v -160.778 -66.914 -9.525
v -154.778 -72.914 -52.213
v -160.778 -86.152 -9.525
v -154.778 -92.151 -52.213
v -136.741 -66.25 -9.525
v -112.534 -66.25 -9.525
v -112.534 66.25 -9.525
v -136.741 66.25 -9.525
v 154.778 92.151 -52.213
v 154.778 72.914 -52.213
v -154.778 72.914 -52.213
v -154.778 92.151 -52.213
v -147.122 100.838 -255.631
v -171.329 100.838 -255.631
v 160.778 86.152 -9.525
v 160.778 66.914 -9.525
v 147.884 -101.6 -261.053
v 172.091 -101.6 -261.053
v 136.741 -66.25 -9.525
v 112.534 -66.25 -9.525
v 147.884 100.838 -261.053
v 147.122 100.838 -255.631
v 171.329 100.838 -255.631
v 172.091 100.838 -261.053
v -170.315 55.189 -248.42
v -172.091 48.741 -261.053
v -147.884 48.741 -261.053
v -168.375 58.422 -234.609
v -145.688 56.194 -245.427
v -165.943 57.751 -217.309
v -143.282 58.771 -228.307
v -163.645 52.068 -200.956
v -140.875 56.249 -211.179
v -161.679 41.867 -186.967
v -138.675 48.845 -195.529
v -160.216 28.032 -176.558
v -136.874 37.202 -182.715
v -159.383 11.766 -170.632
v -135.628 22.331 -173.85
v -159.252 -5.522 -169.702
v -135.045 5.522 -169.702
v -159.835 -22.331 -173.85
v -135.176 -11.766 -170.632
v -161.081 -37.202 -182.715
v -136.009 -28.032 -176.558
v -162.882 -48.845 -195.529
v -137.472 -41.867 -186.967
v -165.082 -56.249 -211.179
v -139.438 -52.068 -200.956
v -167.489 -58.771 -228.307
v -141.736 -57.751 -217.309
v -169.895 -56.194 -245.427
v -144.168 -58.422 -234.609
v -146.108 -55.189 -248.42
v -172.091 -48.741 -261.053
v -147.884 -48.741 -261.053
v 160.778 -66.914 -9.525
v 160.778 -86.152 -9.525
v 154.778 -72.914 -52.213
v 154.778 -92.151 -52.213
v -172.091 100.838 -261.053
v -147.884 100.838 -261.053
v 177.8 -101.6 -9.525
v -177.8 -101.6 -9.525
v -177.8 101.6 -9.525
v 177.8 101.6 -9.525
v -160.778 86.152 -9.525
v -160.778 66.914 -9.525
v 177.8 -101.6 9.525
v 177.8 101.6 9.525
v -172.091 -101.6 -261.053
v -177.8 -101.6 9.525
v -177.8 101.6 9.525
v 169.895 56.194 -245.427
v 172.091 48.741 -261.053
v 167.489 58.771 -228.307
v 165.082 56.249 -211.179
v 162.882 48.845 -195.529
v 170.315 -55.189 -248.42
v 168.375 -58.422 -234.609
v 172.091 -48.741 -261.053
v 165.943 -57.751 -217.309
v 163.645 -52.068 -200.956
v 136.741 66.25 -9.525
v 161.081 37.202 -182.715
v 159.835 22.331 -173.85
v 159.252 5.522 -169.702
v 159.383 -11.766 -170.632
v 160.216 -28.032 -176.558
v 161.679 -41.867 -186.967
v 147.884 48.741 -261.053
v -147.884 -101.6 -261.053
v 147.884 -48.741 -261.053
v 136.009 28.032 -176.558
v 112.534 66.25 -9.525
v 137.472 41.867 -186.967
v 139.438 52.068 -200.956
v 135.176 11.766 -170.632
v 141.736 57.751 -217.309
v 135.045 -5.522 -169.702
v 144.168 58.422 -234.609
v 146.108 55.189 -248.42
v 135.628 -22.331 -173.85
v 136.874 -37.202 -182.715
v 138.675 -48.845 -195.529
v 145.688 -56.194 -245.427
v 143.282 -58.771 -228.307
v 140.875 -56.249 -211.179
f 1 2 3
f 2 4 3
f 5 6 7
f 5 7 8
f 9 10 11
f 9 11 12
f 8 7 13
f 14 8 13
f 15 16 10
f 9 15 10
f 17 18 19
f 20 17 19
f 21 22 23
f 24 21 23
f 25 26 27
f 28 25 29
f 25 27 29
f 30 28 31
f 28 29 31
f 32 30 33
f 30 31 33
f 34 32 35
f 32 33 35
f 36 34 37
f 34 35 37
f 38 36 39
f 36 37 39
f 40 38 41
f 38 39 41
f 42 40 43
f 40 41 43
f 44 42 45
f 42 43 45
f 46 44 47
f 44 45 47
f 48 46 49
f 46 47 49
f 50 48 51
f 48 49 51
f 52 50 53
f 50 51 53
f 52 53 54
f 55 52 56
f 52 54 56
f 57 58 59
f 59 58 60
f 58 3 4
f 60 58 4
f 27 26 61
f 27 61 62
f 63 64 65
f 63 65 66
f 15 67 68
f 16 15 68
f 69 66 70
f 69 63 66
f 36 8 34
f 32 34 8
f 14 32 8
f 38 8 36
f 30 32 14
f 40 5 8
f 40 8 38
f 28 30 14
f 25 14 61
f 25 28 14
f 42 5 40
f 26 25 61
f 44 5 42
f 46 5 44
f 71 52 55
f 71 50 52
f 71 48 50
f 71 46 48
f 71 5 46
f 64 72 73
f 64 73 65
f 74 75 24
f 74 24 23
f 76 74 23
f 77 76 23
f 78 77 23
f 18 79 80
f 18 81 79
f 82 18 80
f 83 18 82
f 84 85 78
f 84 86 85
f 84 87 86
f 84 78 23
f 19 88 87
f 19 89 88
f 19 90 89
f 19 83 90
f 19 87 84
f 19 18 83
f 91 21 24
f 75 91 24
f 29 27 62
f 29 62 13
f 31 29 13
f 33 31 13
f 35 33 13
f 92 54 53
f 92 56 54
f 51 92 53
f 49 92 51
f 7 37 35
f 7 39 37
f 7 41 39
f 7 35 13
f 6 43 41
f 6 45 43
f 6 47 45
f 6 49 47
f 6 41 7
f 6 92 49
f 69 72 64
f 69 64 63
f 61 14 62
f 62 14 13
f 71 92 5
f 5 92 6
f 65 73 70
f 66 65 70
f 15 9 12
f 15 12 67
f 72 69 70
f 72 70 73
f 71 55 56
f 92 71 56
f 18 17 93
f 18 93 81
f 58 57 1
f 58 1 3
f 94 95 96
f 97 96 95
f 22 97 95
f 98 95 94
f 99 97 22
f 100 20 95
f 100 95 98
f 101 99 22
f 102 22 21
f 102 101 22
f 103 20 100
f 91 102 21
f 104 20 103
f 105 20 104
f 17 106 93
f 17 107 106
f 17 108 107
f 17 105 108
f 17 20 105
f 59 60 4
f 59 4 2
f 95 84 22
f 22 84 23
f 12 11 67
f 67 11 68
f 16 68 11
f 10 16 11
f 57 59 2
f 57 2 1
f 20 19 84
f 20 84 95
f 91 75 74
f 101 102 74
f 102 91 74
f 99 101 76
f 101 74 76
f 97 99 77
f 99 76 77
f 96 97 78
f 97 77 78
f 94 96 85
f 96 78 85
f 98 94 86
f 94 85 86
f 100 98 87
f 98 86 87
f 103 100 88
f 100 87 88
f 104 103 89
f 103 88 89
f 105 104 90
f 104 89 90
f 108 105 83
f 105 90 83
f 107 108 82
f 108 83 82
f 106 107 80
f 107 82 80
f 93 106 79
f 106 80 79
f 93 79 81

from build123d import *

# Parameters (mm, degrees)
F1_DEPTH       = 101.6
F2_DEPTH       = 101.6
F2_DEPTH_BACK  = 100.838
F4_DEPTH       = 177.801
F4_DEPTH_BACK  = 177.801
F6_DEPTH       = 101.601
F6_DEPTH_BACK  = 101.601
F7_DEPTH       = 101.601
F7_DEPTH_BACK  = 101.601
F8_DEPTH       = 161.798
F8_DEPTH_BACK  = 161.798
F9_DEPTH       = 161.798
F9_DEPTH_BACK  = 161.798
F10_DEPTH      = 101.601
F10_DEPTH_BACK = 101.601


# Not quite as in the source:
# - a feature names something its author has since deleted; it is built from what else it names


with BuildPart() as f1:
    # F0 (on Front) → F1 (new body, symmetric)
    with BuildSketch(Plane.XZ):
        Polygon((177.8, -9.525), (177.8, 9.525), (-177.8, 9.525), (-177.8, -9.525), (-160.77771832, -9.525), (-136.7410615279, -9.525), (-112.5340089202, -9.525), (112.5340089202, -9.525), (136.7410615279, -9.525), (160.77771832, -9.525), align=None)
    extrude(amount=F1_DEPTH, both=True)

    # F0 (on Front) → F6 (cut, two sides)
    with BuildSketch(Plane.XZ) as f6_sk:
        Polygon((177.8, -52.5049223718), (177.8, -9.525), (160.77771832, -9.525), (154.7372841544, -52.5049223718), align=None)
    extrude(amount=F6_DEPTH, mode=Mode.SUBTRACT)
    extrude(f6_sk.sketch, amount=-F6_DEPTH_BACK, mode=Mode.SUBTRACT)

    # F0 (on Front) → F7 (cut, two sides)
    with BuildSketch(Plane.XZ) as f7_sk:
        Polygon((-160.77771832, -9.525), (-177.8, -9.525), (-177.8, -52.5049223718), (-154.7372841544, -52.5049223718), align=None)
    extrude(amount=F7_DEPTH, mode=Mode.SUBTRACT)
    extrude(f7_sk.sketch, amount=-F7_DEPTH_BACK, mode=Mode.SUBTRACT)


with BuildPart() as f2:
    # F0 (on Front) → F2 (new body, two sides)
    with BuildSketch(Plane.XZ) as f2_sk:
        Polygon((-118.5744430858, -52.5049223718), (-142.7814956935, -52.5049223718), (-172.0910291718, -261.0530894604), (-147.883976564, -261.0530894604), align=None)
        Polygon((-112.5340089202, -9.525), (-136.7410615279, -9.525), (-142.7814956935, -52.5049223718), (-118.5744430858, -52.5049223718), align=None)
    extrude(amount=F2_DEPTH)
    extrude(f2_sk.sketch, amount=-F2_DEPTH_BACK)


with BuildPart() as f2b:
    # F0 (on Front) → F2, piece 2 (new body, two sides)
    with BuildSketch(Plane.XZ) as f2_2_sk:
        Polygon((142.7814956935, -52.5049223718), (136.7410615279, -9.525), (112.5340089202, -9.525), (118.5744430858, -52.5049223718), align=None)
        Polygon((172.0910291718, -261.0530894604), (142.7814956935, -52.5049223718), (118.5744430858, -52.5049223718), (147.883976564, -261.0530894604), align=None)
    extrude(amount=F2_DEPTH)
    extrude(f2_2_sk.sketch, amount=-F2_DEPTH_BACK)


with BuildPart() as f4_tool:
    # F3 (on Right) → F4 (new body, two sides)
    with BuildSketch(Plane.YZ) as f4_sk:
        Polygon((100.838, -255.6311777319), (100.838, -9.525), (66.2500323562, -9.525), align=None)
        Polygon((-101.6, -261.0530894604), (-66.2500323562, -9.525), (-101.6, -9.525), align=None)
        with BuildLine():
            Line((-48.7405628211, -261.0530894604), (48.7405628211, -261.0530894604))
            ThreePointArc((48.7405628211, -261.0530894604), (0, -169.4420519551), (-48.7405628211, -261.0530894604))
        make_face()
    extrude(amount=F4_DEPTH)
    extrude(f4_sk.sketch, amount=-F4_DEPTH_BACK)


with BuildPart() as f2_1:
    add(f2.part)

    # F4: cut by f4_tool
    add(f4_tool.part, mode=Mode.SUBTRACT)


with BuildPart() as f2b_1:
    add(f2b.part)

    # F4: cut by f4_tool
    add(f4_tool.part, mode=Mode.SUBTRACT)


with BuildPart() as f8:
    # F5 (on Right) → F8 (new body, two sides)
    with BuildSketch(Plane.YZ) as f8_sk:
        Polygon((-72.9137584568, -52.213318646), (-66.9143065223, -9.525), (-86.1515217788, -9.525), (-92.1509737133, -52.213318646), align=None)
    extrude(amount=F8_DEPTH)
    extrude(f8_sk.sketch, amount=-F8_DEPTH_BACK)


with BuildPart() as f9:
    # F5 (on Right) → F9 (new body, two sides)
    with BuildSketch(Plane.YZ) as f9_sk:
        Polygon((66.9143065223, -9.525), (72.9137584568, -52.213318646), (92.1509737133, -52.213318646), (86.1515217788, -9.525), align=None)
    extrude(amount=F9_DEPTH)
    extrude(f9_sk.sketch, amount=-F9_DEPTH_BACK)


with BuildPart() as f10_tool:
    # F0 (on Front) → F10 (new body, two sides)
    with BuildSketch(Plane.XZ) as f10_sk:
        Polygon((177.8, -52.5049223718), (177.8, -9.525), (160.77771832, -9.525), (154.7372841544, -52.5049223718), align=None)
        Polygon((-160.77771832, -9.525), (-177.8, -9.525), (-177.8, -52.5049223718), (-154.7372841544, -52.5049223718), align=None)
    extrude(amount=F10_DEPTH)
    extrude(f10_sk.sketch, amount=-F10_DEPTH_BACK)


with BuildPart() as f8_1:
    add(f8.part)

    # F10: cut by f10_tool
    add(f10_tool.part, mode=Mode.SUBTRACT)

    # F11: cut F2, F2b
    add(f2_1.part, mode=Mode.SUBTRACT)
    add(f2b_1.part, mode=Mode.SUBTRACT)


with BuildPart() as f9_1:
    add(f9.part)

    # F10: cut by f10_tool
    add(f10_tool.part, mode=Mode.SUBTRACT)

    # F11: cut F2, F2b
    add(f2_1.part, mode=Mode.SUBTRACT)
    add(f2b_1.part, mode=Mode.SUBTRACT)


solid = Compound([f1.part, f2_1.part, f2b_1.part, f8_1.part, f9_1.part])
